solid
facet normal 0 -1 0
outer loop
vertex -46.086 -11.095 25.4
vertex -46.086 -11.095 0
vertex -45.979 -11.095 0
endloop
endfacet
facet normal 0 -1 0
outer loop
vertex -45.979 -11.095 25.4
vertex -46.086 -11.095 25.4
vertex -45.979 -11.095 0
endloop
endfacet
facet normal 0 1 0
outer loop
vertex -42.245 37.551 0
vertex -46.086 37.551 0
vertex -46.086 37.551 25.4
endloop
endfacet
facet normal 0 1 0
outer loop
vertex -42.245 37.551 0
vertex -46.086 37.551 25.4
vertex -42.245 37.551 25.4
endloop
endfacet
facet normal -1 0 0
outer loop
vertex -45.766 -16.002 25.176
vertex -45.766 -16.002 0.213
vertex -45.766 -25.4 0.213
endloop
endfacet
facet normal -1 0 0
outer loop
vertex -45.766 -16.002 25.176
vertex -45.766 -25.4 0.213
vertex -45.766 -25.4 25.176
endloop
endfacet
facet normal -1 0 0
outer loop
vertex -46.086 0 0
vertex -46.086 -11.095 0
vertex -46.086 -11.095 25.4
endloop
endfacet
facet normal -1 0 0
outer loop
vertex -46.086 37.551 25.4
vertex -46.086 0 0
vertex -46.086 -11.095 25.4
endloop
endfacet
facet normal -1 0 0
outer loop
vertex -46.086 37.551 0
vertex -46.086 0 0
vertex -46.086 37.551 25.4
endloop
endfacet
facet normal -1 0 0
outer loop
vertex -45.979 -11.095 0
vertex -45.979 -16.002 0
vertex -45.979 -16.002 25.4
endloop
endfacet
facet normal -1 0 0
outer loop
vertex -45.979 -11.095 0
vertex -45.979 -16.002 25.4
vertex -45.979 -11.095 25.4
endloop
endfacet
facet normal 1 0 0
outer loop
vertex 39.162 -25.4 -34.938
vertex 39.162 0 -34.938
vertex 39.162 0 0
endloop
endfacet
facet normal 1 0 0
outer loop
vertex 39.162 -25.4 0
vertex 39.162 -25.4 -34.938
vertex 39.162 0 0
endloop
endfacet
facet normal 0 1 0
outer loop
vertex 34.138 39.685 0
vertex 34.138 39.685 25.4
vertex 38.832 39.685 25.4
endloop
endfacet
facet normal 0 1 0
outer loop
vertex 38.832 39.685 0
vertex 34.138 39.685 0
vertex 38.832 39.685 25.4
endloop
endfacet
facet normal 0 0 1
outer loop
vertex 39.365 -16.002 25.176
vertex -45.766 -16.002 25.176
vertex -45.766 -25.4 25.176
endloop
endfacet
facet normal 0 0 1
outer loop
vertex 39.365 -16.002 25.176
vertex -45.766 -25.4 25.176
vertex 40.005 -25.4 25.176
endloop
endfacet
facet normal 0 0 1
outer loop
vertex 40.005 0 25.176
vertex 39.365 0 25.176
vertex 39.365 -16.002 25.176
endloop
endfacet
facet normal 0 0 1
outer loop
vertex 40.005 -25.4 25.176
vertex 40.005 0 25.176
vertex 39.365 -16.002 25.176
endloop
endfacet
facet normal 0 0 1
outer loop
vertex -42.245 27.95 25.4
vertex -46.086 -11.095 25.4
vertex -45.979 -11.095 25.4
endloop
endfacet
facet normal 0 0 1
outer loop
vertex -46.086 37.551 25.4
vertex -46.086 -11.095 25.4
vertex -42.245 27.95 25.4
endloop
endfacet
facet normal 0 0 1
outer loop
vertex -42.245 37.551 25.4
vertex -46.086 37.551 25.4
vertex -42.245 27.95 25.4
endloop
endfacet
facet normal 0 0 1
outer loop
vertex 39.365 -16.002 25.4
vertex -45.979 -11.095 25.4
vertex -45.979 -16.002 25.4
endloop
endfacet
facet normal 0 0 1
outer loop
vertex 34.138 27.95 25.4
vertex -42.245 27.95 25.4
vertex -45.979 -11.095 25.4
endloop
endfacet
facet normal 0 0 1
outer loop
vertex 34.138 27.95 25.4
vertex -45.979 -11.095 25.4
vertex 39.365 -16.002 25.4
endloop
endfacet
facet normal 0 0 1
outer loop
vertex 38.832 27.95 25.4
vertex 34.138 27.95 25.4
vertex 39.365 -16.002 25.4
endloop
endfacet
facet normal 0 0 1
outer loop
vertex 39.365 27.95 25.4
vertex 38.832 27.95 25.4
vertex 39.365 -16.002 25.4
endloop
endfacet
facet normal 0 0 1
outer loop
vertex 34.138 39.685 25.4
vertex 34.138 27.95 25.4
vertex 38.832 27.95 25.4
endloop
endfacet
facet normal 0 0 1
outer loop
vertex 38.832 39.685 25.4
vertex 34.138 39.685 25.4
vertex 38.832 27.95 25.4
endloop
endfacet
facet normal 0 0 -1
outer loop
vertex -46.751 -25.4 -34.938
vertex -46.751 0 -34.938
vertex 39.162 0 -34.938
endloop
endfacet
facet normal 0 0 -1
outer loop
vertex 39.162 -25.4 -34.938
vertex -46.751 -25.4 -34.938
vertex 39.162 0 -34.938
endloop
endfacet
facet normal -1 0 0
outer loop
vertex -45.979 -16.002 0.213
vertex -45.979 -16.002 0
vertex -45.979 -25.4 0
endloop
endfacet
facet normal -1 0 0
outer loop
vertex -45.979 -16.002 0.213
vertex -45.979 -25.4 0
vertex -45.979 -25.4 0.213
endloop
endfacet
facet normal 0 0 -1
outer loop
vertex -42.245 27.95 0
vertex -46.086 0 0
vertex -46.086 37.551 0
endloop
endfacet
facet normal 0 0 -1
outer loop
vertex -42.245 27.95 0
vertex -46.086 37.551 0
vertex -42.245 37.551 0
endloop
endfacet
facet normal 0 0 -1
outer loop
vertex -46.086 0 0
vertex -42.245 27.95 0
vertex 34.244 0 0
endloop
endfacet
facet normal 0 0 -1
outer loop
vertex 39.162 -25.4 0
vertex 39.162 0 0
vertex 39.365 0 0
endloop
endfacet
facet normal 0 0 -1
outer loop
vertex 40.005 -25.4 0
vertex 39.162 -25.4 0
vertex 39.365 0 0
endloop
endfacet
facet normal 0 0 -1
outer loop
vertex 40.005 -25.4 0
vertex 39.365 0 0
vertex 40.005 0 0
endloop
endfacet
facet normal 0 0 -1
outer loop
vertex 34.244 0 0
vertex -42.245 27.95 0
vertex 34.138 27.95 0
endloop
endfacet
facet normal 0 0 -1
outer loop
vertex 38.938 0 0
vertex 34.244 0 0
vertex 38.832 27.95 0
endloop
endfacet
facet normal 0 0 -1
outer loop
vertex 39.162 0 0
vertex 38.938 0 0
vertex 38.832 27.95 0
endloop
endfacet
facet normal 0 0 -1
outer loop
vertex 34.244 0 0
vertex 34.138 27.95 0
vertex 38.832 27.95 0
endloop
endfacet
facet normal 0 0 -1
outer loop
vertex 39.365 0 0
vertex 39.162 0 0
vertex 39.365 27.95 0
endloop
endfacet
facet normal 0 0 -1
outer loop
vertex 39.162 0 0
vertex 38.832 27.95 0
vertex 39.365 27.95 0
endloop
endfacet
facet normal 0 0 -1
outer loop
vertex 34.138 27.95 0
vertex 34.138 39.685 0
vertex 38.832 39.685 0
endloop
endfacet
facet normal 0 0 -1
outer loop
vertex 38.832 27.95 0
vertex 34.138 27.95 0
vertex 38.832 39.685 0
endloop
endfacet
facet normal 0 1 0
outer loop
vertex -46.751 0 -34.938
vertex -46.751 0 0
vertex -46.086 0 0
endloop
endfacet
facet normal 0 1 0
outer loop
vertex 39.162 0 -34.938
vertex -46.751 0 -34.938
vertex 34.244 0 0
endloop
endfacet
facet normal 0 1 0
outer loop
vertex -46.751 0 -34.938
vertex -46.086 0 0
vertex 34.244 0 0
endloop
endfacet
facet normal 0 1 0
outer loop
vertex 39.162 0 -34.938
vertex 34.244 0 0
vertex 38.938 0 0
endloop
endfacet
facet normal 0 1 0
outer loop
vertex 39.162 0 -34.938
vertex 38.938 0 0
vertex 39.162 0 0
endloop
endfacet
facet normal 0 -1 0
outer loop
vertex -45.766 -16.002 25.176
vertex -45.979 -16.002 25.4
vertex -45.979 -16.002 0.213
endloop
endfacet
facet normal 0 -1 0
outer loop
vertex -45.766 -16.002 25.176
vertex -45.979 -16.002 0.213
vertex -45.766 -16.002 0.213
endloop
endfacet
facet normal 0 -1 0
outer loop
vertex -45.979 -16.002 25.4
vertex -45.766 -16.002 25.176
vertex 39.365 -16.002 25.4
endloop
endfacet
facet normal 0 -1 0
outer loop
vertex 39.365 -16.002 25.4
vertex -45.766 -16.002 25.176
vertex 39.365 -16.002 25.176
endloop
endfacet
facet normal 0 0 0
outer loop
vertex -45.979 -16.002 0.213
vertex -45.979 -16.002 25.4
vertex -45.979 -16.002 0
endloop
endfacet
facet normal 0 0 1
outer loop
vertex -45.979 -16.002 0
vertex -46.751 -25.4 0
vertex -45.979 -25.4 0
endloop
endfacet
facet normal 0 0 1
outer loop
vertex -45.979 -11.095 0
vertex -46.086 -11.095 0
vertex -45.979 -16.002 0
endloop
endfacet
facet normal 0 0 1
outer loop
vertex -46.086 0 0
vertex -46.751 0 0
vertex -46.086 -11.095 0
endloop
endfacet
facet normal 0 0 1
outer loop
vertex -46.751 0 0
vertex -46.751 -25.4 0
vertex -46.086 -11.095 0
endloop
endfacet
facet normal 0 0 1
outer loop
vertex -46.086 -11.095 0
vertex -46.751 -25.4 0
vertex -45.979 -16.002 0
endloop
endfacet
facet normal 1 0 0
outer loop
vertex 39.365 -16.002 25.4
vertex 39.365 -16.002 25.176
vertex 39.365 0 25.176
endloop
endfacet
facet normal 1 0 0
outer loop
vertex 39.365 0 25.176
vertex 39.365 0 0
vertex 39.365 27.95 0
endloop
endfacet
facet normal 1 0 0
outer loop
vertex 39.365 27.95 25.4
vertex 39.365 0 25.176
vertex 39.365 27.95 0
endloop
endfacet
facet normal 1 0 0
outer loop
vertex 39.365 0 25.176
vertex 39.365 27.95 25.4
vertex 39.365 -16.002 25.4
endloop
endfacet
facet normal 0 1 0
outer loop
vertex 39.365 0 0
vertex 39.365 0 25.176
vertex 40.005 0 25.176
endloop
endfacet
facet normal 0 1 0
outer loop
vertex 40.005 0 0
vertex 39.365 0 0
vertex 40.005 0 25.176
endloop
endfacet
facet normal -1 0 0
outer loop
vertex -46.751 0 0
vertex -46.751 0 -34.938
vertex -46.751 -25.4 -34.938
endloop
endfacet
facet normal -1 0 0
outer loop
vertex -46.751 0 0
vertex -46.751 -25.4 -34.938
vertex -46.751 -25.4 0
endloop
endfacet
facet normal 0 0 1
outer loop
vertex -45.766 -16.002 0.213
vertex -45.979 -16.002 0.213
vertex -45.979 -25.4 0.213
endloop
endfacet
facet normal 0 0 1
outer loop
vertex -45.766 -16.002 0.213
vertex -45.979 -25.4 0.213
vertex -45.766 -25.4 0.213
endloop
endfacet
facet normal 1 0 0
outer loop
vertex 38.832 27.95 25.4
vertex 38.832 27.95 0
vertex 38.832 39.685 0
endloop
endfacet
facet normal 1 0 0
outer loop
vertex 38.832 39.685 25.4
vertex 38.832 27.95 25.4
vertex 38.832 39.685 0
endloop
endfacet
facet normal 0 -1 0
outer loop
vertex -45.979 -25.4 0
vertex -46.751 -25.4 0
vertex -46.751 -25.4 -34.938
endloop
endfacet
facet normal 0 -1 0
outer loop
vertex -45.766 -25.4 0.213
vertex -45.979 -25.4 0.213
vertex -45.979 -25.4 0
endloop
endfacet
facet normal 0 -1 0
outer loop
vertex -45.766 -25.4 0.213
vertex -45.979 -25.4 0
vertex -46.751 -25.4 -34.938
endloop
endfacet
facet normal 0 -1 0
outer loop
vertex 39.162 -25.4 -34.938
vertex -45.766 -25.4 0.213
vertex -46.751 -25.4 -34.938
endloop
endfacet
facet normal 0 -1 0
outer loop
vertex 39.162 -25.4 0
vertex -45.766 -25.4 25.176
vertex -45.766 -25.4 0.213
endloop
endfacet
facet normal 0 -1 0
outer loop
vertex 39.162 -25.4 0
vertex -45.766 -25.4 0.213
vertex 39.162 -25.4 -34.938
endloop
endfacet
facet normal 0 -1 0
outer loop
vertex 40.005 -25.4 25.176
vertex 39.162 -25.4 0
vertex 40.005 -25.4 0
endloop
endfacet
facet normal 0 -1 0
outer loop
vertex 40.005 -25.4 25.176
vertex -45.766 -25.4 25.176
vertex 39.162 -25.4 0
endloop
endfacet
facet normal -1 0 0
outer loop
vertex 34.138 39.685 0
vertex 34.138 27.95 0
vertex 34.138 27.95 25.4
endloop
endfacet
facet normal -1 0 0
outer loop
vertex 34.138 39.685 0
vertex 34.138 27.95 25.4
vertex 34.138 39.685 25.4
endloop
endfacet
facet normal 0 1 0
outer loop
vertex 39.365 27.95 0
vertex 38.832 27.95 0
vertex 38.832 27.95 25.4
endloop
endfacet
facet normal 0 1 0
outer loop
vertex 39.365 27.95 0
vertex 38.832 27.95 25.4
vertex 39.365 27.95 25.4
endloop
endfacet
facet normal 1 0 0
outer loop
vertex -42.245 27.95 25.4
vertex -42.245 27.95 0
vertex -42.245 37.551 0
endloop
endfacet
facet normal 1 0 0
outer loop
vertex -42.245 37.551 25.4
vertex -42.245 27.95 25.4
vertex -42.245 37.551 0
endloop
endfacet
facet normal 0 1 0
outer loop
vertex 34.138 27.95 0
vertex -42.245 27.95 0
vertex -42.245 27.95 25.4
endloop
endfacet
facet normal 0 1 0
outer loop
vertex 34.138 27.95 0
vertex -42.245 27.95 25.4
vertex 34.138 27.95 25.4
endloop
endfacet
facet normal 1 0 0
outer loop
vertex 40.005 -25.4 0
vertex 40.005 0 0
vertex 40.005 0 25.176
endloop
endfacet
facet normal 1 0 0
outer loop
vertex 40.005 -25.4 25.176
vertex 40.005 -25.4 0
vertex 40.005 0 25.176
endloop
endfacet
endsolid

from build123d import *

# Parameters (mm, degrees)
F0_W      = 85.343997
F0_H      = 43.952162
F3_DEPTH  = 25.4
F1_W      = 4.267193
F1_H      = 32.43072
F1_W_2    = 4.693918
F1_H_2    = 33.284161
F4_DEPTH  = 25.4
F2_W      = 4.693918
F2_H      = 33.710879
F2_W_2    = 3.840477
F2_H_2    = 32.857437
F5_DEPTH  = 25.4
F6_W      = 3.840476
F6_H      = 48.646077
F6_W_2    = 4.693918
F6_H_2    = 51.206397
F7_DEPTH  = 25.4
F8_W      = 85.770724
F8_H      = 25.17648
F9_DEPTH  = 25.4
F10_W     = 85.912641
F10_H     = 34.937669
F11_DEPTH = 25.4


with BuildPart() as f3:
    # F0 (on Top) → F3 (new body)
    with BuildSketch(Plane.XY):
        with Locations((-3.30708, 5.97408)):
            Rectangle(F0_W, F0_H)
    extrude(amount=F3_DEPTH)

    # F1 (on Front) → F4 (join)
    with BuildSketch(Plane.XZ):
        with Locations((-43.845478, -16.002001)):
            Rectangle(F1_W, F1_H)
        with Locations((36.591239, -16.64208)):
            Rectangle(F1_W_2, F1_H_2)
    extrude(amount=F4_DEPTH)

    # F2 (on Front) → F5 (join)
    with BuildSketch(Plane.XZ):
        with Locations((36.484562, -16.642081)):
            Rectangle(F2_W, F2_H)
        with Locations((-43.952159, -16.21536)):
            Rectangle(F2_W_2, F2_H_2)
    extrude(amount=F5_DEPTH)

    # F6 (on Top) → F7 (join)
    with BuildSketch(Plane.XY):
        with Locations((-44.165522, 13.22832)):
            Rectangle(F6_W, F6_H)
        with Locations((36.484562, 14.08176)):
            Rectangle(F6_W_2, F6_H_2)
    extrude(amount=F7_DEPTH)

    # F8 (on Front) → F9 (join)
    with BuildSketch(Plane.XZ):
        with Locations((-2.88036, 12.58824)):
            Rectangle(F8_W, F8_H)
    extrude(amount=F9_DEPTH)

    # F10 (on Front) → F11 (join)
    with BuildSketch(Plane.XZ):
        with Locations((-3.794318, -17.468834)):
            Rectangle(F10_W, F10_H)
    extrude(amount=F11_DEPTH)


solid = f3.part
